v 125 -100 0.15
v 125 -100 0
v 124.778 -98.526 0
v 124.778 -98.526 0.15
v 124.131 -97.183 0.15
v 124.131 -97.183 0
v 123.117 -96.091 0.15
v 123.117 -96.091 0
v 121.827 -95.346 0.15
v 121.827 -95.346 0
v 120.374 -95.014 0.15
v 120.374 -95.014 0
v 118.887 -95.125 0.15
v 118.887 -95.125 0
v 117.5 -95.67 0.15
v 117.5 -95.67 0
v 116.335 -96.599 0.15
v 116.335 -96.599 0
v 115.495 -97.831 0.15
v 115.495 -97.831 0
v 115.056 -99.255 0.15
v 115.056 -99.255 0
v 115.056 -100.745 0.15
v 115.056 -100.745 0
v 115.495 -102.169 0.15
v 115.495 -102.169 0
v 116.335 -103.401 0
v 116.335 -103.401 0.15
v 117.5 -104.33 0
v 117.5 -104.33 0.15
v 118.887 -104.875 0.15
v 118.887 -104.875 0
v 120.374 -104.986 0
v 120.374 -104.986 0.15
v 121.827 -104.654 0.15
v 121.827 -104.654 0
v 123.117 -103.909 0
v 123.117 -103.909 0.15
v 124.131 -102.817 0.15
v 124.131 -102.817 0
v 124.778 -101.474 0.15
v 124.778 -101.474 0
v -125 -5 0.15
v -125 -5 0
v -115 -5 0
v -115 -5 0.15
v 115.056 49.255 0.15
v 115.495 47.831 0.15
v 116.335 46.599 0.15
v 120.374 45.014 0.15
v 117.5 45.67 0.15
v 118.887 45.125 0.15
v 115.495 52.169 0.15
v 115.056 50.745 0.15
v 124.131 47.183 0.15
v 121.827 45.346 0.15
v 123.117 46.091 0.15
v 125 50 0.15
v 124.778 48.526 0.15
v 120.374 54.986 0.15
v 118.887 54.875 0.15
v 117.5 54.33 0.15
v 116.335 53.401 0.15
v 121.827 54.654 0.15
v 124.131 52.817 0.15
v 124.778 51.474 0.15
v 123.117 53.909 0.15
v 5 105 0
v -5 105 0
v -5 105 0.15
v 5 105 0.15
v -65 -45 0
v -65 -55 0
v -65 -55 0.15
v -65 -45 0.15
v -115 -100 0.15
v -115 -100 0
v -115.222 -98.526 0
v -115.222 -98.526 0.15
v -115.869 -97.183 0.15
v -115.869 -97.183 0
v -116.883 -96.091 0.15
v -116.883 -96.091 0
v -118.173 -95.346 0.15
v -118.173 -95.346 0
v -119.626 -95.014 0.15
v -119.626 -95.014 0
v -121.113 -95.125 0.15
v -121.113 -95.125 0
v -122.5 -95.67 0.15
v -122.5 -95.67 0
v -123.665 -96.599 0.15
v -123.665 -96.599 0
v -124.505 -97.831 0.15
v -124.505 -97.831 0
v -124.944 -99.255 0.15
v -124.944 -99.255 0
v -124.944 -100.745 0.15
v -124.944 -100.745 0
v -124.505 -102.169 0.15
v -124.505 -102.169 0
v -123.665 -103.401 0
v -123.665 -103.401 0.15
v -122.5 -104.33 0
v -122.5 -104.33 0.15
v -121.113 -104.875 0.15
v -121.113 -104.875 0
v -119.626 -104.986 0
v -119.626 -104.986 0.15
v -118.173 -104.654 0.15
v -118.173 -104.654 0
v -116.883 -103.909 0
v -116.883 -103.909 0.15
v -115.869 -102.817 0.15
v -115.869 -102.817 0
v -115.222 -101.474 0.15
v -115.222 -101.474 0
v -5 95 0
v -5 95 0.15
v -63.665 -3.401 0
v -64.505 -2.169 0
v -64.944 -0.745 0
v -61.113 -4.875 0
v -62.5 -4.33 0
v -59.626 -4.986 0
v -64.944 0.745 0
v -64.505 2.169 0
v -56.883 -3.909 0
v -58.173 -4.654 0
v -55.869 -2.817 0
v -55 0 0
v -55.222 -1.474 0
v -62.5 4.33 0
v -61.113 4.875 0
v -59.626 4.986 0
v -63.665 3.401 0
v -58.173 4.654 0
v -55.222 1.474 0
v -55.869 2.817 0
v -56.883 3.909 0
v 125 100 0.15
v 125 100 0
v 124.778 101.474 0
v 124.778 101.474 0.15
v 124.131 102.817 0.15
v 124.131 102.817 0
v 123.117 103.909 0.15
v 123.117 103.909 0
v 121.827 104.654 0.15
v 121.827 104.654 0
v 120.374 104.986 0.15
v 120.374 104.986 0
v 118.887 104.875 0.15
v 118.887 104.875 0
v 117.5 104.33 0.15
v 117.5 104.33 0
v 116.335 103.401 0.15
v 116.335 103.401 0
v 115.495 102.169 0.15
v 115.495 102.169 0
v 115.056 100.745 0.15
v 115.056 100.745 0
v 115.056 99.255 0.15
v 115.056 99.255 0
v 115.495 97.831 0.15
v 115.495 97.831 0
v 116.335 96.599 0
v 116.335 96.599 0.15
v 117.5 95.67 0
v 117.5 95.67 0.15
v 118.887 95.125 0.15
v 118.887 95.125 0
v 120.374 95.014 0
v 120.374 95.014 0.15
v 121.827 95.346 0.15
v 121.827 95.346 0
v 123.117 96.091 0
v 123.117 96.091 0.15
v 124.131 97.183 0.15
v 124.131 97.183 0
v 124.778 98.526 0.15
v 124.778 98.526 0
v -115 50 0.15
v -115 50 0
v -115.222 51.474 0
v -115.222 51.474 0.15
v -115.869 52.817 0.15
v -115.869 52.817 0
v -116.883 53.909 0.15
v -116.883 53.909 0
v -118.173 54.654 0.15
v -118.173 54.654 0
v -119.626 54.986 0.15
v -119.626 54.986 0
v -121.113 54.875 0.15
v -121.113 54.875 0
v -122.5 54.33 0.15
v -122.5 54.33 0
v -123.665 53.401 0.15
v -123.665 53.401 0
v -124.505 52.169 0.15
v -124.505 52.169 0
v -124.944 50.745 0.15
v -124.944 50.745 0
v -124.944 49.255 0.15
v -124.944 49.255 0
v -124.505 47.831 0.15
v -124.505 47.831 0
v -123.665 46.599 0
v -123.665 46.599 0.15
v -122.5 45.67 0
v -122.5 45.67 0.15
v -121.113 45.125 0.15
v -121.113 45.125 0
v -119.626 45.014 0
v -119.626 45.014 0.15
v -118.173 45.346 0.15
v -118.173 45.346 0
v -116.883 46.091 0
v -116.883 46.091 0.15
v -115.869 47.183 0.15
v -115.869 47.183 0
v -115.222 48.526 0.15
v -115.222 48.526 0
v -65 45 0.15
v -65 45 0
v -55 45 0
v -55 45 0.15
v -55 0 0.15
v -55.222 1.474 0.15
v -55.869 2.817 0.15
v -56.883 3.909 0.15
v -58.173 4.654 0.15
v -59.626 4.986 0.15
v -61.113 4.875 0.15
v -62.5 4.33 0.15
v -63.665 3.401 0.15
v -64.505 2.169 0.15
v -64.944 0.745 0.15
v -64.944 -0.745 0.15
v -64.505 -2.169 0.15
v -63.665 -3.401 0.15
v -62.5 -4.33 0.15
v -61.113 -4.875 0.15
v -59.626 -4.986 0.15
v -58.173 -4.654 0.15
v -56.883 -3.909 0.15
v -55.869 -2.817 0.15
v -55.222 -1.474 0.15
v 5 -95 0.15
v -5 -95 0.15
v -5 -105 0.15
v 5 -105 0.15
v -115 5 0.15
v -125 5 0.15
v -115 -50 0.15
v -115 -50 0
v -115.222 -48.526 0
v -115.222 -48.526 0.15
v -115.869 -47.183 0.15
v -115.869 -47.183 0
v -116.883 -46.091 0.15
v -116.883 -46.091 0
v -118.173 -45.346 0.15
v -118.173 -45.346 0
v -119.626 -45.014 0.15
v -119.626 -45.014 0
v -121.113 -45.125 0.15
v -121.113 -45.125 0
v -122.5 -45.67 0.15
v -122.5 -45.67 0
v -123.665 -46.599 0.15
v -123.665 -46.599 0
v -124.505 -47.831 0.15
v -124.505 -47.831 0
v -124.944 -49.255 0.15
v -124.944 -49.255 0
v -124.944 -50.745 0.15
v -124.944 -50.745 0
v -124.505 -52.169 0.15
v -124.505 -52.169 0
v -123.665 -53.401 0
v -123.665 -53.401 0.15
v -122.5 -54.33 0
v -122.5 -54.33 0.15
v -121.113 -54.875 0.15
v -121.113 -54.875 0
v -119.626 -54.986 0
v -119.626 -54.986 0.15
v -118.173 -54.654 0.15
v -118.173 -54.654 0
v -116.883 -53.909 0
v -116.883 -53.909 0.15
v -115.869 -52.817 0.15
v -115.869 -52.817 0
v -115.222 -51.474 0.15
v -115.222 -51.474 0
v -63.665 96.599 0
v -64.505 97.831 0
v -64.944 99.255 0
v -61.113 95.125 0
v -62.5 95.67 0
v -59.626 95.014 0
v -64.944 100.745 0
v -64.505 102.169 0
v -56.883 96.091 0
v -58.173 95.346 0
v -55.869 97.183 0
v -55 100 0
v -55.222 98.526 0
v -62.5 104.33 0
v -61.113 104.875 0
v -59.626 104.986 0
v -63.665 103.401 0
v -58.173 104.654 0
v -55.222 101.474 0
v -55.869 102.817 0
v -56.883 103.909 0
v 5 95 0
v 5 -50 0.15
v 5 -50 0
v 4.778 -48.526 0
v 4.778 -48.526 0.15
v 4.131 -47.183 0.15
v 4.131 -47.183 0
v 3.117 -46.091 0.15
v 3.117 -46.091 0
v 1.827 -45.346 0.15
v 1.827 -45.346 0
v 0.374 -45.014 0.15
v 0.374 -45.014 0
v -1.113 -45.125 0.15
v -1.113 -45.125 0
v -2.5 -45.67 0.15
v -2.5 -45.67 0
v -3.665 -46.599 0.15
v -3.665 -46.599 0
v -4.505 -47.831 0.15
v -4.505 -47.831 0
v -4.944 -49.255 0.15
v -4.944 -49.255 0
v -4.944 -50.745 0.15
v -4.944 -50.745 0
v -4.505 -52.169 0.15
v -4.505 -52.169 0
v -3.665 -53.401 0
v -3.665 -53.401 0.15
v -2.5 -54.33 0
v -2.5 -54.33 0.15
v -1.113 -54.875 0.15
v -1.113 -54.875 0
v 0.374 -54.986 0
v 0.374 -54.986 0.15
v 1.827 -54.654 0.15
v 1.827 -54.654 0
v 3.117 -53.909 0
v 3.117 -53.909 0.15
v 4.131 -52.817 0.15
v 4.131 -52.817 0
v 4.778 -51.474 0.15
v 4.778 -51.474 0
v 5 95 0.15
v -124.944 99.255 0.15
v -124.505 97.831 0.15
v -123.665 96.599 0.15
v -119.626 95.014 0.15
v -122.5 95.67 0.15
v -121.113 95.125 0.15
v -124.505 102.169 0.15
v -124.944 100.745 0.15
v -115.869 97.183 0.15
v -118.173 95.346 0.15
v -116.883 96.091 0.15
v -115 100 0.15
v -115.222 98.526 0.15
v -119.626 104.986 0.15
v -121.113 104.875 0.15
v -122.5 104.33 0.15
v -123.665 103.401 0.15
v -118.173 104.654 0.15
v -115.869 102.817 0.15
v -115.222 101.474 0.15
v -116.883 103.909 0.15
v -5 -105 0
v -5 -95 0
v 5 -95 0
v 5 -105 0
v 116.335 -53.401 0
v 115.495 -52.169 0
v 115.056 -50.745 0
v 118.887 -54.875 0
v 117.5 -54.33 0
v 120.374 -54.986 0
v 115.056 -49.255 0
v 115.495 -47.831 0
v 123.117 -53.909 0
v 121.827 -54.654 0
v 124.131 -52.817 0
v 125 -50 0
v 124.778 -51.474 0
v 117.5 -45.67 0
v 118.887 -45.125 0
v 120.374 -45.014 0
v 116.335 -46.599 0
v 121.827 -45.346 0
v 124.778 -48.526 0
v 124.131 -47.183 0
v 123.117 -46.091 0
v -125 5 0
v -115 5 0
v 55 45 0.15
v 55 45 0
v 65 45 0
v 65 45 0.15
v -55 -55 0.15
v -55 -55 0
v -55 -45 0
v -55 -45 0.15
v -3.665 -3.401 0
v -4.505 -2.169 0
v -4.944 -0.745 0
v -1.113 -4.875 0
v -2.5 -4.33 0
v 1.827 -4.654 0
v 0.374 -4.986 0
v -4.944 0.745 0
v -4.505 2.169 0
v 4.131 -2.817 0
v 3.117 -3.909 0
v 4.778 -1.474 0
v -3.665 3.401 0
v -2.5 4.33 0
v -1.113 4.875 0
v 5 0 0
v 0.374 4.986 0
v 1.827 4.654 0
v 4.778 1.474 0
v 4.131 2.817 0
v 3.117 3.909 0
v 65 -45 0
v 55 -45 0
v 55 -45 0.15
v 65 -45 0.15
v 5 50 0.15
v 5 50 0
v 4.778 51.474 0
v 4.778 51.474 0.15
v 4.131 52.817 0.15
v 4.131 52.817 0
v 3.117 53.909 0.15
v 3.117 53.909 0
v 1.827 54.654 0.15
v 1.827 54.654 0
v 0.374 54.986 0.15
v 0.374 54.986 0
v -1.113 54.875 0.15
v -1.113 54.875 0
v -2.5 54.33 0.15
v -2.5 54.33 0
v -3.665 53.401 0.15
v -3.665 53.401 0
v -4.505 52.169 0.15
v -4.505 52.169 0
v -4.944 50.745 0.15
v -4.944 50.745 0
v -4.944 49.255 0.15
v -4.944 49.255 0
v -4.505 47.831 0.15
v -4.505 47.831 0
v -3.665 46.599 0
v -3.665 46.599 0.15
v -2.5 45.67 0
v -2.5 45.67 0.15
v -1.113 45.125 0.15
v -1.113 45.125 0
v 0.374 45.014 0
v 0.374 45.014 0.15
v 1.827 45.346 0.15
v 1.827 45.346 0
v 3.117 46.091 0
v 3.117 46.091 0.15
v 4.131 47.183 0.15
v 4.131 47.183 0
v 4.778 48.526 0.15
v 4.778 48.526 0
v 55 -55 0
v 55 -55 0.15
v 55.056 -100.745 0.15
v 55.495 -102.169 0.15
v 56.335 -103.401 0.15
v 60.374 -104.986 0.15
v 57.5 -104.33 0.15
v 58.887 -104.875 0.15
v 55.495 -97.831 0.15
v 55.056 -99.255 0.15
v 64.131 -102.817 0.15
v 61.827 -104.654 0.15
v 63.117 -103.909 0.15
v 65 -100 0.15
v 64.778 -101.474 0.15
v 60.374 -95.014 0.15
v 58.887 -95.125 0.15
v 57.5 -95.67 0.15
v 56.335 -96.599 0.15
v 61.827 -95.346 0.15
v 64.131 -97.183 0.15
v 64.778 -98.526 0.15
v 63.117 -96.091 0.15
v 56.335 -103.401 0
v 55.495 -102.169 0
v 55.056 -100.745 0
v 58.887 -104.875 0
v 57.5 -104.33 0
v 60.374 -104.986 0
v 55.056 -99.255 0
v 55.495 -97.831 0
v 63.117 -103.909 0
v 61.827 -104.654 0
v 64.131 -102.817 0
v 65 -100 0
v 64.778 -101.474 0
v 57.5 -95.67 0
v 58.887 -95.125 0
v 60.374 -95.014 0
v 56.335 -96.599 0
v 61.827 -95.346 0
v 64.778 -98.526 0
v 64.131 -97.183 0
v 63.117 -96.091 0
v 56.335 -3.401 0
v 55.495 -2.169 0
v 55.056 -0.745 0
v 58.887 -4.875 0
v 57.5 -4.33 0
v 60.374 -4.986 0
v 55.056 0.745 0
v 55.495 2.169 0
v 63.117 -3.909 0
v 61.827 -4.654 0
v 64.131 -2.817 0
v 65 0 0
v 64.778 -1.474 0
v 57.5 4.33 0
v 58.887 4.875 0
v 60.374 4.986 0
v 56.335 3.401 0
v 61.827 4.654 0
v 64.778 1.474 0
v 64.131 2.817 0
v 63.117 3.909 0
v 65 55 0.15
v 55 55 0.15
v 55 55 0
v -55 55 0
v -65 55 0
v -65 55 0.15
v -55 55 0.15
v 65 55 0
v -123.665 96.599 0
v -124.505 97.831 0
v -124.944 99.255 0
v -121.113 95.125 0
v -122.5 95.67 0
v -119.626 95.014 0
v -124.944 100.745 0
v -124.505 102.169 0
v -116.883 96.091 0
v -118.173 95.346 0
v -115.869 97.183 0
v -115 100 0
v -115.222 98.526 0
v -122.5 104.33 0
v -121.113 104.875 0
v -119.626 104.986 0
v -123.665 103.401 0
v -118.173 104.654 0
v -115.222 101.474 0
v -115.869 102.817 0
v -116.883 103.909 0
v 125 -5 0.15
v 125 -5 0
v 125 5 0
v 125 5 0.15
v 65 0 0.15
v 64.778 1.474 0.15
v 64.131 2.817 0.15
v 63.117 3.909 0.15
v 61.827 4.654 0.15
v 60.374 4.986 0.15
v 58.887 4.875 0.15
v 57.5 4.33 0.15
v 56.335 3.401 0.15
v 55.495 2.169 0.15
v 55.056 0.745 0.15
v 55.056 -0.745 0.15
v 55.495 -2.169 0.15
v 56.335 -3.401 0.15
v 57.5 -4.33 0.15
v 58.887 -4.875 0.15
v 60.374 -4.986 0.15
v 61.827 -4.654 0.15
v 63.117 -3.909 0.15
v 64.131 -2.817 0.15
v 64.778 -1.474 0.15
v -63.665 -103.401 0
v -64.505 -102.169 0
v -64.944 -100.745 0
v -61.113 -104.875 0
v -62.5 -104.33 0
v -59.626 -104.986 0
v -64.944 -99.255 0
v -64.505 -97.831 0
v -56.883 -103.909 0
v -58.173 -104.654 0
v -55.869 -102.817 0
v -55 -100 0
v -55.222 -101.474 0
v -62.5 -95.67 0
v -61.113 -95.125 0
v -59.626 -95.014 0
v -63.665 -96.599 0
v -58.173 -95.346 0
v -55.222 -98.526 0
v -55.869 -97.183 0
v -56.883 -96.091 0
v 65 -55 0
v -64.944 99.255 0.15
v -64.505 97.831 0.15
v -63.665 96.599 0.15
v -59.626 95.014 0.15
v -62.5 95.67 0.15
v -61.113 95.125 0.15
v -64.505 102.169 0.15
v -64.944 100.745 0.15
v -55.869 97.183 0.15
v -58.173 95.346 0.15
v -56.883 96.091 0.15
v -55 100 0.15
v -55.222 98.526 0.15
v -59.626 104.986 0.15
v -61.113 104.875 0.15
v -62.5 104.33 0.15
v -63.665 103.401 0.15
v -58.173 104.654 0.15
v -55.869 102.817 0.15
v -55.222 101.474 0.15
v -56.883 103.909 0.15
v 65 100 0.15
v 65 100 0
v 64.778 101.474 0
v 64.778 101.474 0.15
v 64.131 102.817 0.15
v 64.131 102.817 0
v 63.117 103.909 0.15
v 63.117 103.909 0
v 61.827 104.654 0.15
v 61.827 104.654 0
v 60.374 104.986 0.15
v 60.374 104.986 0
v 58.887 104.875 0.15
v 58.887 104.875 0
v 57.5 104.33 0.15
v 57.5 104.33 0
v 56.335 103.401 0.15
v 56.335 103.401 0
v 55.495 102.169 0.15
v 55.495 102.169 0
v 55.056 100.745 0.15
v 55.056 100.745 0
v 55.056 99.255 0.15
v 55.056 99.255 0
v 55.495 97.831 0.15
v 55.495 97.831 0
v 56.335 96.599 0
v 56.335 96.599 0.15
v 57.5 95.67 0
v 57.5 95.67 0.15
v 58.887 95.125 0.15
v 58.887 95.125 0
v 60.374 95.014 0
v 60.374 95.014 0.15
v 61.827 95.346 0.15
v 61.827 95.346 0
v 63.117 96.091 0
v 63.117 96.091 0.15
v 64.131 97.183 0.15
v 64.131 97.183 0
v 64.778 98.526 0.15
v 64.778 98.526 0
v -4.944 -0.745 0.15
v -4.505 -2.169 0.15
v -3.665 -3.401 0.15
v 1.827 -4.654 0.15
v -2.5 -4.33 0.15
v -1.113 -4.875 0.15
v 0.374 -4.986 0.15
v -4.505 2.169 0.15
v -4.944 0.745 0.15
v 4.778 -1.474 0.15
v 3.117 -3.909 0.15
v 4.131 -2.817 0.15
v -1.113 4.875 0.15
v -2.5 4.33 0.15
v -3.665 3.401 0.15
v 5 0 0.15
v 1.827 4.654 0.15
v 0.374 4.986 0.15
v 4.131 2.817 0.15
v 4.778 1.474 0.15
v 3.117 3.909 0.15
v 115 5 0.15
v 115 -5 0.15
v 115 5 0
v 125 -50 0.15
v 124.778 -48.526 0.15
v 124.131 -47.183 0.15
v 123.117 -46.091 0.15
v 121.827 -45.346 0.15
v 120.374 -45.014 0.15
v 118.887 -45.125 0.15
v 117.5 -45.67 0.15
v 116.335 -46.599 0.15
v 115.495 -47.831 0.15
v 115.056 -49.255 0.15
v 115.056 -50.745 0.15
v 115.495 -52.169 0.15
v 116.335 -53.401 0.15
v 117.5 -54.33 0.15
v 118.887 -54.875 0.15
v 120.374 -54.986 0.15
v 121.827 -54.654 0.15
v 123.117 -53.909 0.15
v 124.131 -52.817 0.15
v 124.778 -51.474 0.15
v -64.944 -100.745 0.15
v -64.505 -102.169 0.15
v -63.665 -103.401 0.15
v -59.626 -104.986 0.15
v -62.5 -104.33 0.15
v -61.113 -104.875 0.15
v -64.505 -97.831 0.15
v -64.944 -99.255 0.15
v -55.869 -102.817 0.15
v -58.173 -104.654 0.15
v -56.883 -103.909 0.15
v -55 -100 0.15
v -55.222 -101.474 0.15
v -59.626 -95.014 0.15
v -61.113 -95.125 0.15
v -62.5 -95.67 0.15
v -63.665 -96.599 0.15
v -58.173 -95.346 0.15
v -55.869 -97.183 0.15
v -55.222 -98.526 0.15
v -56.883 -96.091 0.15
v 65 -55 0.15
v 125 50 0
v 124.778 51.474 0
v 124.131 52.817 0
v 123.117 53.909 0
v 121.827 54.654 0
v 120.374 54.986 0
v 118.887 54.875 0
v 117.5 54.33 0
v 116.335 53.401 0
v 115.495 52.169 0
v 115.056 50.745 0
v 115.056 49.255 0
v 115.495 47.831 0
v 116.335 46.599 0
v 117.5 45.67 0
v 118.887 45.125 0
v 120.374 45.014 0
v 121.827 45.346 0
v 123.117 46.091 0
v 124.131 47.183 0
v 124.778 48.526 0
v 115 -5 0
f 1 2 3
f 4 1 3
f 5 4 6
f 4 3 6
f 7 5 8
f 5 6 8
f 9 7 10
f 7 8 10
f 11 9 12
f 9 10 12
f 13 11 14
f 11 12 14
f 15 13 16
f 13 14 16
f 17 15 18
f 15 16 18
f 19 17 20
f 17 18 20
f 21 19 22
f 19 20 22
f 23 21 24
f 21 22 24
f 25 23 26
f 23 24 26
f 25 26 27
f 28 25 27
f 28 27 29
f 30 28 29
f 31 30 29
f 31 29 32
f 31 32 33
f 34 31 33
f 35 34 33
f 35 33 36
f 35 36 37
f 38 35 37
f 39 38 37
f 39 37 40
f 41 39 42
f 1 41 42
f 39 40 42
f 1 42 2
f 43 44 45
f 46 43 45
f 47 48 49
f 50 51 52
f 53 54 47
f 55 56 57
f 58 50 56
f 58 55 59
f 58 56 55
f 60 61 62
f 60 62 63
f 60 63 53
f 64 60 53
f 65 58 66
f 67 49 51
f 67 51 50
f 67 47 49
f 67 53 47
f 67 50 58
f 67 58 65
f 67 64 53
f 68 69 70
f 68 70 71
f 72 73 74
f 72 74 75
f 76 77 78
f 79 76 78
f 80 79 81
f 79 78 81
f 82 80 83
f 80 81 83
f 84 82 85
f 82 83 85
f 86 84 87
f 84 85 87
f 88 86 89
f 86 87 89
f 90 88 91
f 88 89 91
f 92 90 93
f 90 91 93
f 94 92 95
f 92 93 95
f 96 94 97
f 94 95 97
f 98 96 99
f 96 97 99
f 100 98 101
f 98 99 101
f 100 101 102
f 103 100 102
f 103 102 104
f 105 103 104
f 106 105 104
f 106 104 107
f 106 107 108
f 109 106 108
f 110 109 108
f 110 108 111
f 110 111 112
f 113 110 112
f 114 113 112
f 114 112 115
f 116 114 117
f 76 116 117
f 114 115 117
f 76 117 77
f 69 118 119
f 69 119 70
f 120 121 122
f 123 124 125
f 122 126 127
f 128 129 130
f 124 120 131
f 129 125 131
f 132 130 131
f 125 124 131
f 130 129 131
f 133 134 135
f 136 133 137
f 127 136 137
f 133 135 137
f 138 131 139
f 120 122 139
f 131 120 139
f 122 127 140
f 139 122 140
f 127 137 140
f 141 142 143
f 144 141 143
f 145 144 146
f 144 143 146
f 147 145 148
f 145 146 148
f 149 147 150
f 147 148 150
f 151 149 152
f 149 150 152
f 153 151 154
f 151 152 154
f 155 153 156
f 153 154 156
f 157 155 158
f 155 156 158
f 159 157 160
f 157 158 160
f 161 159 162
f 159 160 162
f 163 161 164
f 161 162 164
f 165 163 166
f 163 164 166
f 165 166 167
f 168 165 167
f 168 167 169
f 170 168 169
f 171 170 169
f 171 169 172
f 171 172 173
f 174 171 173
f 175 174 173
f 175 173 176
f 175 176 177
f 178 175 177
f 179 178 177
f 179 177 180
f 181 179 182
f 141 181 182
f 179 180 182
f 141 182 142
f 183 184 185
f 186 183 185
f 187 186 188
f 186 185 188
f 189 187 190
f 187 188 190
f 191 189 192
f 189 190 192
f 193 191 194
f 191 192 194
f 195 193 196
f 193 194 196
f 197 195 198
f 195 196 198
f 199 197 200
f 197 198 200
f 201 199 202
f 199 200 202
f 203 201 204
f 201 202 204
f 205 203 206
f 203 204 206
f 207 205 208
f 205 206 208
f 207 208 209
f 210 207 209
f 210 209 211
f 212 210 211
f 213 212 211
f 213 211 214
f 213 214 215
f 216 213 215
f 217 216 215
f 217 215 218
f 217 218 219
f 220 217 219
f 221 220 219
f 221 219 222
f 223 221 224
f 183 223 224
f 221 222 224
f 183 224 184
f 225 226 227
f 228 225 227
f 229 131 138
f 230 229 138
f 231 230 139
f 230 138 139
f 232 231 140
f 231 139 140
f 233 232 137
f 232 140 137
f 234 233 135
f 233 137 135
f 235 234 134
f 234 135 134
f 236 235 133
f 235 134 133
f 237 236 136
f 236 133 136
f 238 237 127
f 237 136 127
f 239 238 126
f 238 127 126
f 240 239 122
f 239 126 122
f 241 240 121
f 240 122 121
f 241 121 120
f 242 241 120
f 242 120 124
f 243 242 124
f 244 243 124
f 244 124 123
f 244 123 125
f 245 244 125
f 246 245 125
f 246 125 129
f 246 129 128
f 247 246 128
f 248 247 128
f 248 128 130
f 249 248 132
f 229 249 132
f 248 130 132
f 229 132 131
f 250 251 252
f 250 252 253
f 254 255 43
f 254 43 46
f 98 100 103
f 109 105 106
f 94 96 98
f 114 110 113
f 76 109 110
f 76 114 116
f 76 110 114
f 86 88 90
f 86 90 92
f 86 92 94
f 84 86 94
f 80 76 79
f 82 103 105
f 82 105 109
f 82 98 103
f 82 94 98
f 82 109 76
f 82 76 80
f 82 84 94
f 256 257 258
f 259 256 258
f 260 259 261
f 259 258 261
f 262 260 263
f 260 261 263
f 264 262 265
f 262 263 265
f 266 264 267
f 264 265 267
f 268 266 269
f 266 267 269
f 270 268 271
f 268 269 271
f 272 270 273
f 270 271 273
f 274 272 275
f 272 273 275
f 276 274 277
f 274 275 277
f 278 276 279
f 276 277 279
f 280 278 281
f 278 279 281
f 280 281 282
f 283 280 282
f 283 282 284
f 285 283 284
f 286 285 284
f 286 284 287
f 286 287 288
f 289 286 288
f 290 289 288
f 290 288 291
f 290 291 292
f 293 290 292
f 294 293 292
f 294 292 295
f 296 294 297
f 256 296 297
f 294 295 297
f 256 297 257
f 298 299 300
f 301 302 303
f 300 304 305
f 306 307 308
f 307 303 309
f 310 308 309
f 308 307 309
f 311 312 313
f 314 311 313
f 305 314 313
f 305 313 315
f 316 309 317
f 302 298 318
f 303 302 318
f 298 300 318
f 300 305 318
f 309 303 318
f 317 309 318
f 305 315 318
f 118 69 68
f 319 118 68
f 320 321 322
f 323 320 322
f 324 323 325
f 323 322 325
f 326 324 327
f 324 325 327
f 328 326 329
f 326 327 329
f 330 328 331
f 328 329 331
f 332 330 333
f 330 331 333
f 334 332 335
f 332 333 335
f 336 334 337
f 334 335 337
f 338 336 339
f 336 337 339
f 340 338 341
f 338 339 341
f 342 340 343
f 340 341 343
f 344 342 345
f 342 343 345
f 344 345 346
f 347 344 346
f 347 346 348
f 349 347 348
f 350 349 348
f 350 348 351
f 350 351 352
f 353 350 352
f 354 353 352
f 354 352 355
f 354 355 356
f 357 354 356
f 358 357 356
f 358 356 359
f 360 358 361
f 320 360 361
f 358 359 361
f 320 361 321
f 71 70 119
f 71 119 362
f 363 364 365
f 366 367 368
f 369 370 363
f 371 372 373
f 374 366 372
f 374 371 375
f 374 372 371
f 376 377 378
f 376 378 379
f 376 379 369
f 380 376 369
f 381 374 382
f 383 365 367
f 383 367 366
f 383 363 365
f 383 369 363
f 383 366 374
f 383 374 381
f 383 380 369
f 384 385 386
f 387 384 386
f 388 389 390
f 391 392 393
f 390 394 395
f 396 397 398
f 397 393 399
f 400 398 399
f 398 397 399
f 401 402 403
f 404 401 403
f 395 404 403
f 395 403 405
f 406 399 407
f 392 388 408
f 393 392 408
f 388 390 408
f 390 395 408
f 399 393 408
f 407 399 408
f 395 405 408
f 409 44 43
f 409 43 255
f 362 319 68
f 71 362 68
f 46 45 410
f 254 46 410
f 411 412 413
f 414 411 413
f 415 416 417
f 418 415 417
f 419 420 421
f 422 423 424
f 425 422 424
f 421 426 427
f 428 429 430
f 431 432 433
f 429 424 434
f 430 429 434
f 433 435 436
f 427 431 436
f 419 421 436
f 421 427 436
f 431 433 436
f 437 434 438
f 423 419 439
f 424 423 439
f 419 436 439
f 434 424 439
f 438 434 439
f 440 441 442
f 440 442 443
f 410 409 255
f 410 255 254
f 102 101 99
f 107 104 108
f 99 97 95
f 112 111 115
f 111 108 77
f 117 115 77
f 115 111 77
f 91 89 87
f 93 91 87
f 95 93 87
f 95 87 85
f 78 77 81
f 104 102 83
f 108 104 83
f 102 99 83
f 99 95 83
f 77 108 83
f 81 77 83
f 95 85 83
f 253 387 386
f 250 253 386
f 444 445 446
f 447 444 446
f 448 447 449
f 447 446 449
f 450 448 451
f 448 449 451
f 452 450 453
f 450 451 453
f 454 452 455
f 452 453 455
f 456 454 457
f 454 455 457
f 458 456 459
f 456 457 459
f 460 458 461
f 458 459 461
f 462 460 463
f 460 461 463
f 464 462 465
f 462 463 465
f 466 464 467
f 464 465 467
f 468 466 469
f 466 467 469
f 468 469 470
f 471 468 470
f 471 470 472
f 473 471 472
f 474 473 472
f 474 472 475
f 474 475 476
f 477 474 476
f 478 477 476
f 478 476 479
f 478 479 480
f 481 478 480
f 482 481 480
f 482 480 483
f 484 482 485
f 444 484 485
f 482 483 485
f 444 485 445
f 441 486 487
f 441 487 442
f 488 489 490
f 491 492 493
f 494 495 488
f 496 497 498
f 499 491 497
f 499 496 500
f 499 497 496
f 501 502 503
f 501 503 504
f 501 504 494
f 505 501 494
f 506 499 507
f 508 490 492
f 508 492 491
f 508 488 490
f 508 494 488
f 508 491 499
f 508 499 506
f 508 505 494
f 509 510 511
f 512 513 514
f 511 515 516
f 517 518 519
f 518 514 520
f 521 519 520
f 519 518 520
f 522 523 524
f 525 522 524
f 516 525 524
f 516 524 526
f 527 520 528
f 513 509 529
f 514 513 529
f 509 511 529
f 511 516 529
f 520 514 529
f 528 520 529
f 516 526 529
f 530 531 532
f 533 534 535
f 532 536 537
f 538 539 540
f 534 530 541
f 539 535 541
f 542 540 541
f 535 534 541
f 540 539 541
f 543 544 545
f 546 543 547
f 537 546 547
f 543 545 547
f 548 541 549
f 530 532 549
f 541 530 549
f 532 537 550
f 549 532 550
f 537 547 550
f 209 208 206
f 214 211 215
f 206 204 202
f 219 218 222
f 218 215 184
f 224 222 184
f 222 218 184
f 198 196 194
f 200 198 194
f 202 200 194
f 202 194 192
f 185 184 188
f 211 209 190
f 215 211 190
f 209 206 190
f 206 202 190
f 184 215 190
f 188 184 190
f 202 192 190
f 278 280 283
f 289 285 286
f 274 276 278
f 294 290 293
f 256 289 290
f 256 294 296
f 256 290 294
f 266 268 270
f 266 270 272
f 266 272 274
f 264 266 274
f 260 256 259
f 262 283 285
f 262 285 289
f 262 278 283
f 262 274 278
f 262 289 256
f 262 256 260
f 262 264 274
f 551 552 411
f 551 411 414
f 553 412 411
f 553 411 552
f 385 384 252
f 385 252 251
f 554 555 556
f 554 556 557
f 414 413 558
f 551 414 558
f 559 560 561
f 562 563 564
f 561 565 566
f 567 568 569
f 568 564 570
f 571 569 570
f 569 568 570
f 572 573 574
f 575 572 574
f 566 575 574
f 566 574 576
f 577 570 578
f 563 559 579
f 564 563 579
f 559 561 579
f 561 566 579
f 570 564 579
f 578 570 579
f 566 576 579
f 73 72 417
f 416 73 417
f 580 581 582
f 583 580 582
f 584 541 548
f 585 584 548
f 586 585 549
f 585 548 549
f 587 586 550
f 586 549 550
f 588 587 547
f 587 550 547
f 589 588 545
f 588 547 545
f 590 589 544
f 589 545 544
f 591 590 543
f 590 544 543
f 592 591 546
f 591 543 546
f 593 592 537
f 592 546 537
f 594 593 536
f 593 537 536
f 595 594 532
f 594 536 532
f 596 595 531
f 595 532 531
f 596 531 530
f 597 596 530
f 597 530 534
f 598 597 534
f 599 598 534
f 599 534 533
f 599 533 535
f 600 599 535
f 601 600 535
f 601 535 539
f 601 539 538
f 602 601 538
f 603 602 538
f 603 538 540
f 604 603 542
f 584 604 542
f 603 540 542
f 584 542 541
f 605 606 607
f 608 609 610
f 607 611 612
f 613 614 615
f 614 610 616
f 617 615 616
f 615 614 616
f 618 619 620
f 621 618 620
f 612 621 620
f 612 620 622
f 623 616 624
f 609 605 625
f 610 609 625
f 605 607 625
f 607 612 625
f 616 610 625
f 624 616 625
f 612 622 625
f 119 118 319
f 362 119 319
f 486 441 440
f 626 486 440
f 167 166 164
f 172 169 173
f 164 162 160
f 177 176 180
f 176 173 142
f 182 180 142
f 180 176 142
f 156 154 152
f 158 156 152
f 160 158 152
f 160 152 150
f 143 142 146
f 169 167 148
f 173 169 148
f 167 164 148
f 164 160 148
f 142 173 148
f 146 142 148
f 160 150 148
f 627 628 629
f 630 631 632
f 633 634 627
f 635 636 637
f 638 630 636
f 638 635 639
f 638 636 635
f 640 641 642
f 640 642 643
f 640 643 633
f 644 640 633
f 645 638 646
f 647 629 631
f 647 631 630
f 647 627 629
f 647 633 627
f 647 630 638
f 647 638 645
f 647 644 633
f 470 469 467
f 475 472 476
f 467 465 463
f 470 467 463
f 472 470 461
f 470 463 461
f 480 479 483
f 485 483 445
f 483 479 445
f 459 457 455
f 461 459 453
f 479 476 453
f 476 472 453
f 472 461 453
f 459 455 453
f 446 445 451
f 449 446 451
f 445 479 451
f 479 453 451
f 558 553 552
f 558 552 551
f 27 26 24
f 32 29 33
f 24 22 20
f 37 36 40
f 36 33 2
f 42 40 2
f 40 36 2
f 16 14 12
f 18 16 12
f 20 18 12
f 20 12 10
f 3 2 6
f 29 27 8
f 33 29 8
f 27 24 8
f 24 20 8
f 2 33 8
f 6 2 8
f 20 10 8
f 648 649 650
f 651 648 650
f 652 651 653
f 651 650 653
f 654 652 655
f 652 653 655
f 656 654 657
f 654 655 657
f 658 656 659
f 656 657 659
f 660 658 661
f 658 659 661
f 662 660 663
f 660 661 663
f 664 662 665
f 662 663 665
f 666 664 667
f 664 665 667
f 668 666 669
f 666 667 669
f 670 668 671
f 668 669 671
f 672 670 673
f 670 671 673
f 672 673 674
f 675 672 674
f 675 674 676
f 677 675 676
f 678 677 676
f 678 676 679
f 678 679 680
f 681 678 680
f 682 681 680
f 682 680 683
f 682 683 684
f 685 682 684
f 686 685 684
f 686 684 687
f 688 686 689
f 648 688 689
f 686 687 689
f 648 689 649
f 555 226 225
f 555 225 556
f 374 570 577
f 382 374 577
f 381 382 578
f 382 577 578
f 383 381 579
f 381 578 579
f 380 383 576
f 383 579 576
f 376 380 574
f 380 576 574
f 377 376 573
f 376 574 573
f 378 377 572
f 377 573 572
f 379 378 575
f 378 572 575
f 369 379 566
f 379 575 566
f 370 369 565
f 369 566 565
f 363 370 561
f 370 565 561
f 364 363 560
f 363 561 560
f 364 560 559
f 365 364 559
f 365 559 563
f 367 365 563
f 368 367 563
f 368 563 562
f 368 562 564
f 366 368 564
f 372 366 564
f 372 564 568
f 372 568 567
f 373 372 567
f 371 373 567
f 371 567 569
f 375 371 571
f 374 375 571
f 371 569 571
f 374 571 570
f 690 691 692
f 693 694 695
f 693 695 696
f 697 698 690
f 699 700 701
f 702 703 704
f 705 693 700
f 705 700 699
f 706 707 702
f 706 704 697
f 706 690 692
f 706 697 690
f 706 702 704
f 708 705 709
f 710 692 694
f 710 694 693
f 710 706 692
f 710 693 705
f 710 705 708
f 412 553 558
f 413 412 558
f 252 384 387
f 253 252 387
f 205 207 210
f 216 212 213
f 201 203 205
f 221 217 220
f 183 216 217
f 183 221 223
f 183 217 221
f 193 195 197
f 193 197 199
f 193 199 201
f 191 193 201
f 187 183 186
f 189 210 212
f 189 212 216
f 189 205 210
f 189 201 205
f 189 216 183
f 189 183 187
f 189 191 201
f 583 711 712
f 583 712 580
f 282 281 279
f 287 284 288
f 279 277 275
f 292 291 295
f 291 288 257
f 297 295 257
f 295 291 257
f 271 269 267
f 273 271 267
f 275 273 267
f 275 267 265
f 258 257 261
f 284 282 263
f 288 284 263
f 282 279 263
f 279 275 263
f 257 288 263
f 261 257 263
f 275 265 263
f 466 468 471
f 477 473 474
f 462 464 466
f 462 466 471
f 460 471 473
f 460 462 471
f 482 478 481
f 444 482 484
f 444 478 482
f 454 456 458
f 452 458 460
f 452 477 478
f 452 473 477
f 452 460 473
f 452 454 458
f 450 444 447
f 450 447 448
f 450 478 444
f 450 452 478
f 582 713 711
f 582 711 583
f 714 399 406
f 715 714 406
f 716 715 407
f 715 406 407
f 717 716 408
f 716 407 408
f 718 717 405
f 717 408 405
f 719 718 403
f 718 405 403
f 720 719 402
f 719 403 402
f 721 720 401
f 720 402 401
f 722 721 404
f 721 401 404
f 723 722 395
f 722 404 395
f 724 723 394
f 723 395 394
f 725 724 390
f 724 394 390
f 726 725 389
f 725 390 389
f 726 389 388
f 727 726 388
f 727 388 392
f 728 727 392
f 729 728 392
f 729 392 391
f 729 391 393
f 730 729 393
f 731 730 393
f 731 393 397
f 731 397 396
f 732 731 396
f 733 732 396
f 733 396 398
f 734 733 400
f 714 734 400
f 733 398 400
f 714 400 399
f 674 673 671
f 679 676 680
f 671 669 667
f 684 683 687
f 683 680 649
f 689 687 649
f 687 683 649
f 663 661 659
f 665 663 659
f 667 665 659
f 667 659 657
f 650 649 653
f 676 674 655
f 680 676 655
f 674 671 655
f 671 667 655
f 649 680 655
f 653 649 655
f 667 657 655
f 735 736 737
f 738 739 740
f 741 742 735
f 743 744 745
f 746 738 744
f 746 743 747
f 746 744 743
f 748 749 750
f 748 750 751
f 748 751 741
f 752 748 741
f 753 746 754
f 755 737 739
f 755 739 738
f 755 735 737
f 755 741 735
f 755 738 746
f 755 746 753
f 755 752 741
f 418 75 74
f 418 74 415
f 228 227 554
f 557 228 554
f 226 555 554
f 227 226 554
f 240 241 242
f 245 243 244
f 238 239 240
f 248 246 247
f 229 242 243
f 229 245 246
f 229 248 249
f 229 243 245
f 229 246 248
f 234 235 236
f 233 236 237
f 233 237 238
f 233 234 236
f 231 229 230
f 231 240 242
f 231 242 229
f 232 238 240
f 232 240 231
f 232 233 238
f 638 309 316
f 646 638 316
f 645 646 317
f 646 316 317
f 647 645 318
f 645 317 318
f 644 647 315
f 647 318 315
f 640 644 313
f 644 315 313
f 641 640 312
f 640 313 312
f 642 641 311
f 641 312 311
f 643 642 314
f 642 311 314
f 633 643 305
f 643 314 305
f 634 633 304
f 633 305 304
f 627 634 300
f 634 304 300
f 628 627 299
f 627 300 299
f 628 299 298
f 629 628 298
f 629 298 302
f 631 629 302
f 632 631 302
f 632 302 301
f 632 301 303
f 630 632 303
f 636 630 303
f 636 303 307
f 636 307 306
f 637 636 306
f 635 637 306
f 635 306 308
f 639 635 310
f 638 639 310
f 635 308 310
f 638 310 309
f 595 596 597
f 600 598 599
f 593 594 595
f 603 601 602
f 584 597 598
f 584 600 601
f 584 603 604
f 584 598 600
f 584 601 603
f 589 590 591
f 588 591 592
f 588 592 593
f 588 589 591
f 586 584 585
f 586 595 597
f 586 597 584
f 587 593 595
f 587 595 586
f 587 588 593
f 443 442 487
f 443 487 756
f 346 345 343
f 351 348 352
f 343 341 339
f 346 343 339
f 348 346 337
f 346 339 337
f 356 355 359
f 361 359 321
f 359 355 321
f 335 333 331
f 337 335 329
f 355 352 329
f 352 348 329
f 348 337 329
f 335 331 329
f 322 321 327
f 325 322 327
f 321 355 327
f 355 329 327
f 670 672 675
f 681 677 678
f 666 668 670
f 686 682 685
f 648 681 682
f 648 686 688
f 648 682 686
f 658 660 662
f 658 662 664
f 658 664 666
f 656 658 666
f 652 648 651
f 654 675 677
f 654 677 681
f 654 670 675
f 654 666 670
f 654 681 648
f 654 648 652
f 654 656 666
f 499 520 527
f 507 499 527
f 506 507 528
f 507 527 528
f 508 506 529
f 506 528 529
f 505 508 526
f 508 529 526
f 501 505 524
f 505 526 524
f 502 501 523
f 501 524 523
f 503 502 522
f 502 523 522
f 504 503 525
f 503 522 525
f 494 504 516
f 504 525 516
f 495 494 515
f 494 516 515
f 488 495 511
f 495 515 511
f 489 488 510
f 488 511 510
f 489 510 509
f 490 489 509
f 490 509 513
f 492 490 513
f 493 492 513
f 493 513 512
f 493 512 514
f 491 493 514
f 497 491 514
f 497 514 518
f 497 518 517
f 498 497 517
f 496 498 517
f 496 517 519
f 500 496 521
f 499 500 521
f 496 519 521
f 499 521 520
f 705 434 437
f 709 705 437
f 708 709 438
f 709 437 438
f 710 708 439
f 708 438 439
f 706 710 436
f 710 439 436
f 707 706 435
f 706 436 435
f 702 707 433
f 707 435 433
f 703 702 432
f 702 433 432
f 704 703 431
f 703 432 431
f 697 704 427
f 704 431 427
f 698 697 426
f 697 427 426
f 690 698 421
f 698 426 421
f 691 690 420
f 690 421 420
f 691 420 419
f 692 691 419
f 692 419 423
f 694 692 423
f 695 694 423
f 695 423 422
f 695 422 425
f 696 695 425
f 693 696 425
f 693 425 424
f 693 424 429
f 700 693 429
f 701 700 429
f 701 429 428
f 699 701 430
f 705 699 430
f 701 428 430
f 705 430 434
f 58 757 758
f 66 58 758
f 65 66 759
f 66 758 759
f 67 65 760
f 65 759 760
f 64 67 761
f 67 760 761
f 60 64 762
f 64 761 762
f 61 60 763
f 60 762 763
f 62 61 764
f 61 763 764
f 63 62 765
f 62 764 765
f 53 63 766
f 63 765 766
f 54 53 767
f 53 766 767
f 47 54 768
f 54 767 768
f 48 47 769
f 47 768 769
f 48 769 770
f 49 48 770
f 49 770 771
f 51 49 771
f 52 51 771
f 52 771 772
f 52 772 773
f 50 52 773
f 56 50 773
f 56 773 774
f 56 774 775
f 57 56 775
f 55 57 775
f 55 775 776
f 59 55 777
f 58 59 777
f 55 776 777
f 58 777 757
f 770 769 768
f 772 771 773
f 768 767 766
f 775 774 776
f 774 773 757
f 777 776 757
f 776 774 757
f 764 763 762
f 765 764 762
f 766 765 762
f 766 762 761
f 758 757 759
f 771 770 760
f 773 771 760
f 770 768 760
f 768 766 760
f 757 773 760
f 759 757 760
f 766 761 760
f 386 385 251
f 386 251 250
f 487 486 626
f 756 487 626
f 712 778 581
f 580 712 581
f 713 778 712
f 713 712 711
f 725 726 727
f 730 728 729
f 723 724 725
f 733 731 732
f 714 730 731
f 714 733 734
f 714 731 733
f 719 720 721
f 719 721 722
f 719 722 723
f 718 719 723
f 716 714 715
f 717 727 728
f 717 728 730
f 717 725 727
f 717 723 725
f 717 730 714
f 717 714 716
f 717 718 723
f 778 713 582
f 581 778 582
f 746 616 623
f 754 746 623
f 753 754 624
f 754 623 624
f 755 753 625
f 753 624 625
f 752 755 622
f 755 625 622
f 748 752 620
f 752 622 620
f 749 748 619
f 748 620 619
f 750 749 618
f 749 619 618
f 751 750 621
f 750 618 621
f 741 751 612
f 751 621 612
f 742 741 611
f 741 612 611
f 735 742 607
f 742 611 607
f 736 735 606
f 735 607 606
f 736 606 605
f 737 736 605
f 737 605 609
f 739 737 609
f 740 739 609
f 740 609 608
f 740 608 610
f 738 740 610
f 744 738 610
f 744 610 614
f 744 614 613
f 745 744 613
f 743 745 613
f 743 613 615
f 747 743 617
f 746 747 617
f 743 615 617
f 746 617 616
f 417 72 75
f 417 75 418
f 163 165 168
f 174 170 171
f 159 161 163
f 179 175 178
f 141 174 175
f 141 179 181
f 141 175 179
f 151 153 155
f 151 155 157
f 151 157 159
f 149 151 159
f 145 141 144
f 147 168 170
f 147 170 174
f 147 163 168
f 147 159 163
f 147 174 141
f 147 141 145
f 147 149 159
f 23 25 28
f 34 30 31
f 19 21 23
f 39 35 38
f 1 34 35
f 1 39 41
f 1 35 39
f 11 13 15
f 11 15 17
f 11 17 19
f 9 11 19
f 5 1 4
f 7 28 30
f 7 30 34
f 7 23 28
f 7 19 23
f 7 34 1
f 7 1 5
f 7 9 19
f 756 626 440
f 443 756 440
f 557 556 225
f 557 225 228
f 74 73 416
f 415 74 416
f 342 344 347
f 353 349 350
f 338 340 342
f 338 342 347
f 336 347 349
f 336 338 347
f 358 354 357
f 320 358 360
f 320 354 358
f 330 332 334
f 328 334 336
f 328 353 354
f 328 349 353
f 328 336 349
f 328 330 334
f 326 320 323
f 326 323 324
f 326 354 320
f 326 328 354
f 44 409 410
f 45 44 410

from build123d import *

# Parameters (mm, degrees)
F0_R     = 5
F0_W     = 10
F0_H     = 10
F1_DEPTH = 0.15


with BuildPart() as f1:
    # F0 (on Top) → F1 (new body)
    with BuildSketch(Plane.XY):
        Circle(F0_R)
        with Locations((-120, 0)):
            Rectangle(F0_W, F0_H)
        with Locations((120, 0)):
            Rectangle(F0_W, F0_H)
        with Locations((0, 100)):
            Rectangle(F0_W, F0_H)
        with Locations((0, -100)):
            Rectangle(F0_W, F0_H)
        with Locations((-120, 100)):
            Circle(F0_R)
        with Locations((120, 100)):
            Circle(F0_R)
        with Locations((-120, -100)):
            Circle(F0_R)
        with Locations((120, -100)):
            Circle(F0_R)
        with Locations((-60, 50)):
            Rectangle(F0_W, F0_H)
        with Locations((-120, 50)):
            Circle(F0_R)
        with Locations((-60, 100)):
            Circle(F0_R)
        with Locations((-60, 0)):
            Circle(F0_R)
        with Locations((60, 100)):
            Circle(F0_R)
        with Locations((120, 50)):
            Circle(F0_R)
        with Locations((-120, -50)):
            Circle(F0_R)
        with Locations((-60, -100)):
            Circle(F0_R)
        with Locations((60, -100)):
            Circle(F0_R)
        with Locations((120, -50)):
            Circle(F0_R)
        with Locations((60, 50)):
            Rectangle(F0_W, F0_H)
        with Locations((-60, -50)):
            Rectangle(F0_W, F0_H)
        with Locations((60, -50)):
            Rectangle(F0_W, F0_H)
        with Locations((0, 50)):
            Circle(F0_R)
        with Locations((0, -50)):
            Circle(F0_R)
        with Locations((60, 0)):
            Circle(F0_R)
    extrude(amount=F1_DEPTH)


solid = f1.part
